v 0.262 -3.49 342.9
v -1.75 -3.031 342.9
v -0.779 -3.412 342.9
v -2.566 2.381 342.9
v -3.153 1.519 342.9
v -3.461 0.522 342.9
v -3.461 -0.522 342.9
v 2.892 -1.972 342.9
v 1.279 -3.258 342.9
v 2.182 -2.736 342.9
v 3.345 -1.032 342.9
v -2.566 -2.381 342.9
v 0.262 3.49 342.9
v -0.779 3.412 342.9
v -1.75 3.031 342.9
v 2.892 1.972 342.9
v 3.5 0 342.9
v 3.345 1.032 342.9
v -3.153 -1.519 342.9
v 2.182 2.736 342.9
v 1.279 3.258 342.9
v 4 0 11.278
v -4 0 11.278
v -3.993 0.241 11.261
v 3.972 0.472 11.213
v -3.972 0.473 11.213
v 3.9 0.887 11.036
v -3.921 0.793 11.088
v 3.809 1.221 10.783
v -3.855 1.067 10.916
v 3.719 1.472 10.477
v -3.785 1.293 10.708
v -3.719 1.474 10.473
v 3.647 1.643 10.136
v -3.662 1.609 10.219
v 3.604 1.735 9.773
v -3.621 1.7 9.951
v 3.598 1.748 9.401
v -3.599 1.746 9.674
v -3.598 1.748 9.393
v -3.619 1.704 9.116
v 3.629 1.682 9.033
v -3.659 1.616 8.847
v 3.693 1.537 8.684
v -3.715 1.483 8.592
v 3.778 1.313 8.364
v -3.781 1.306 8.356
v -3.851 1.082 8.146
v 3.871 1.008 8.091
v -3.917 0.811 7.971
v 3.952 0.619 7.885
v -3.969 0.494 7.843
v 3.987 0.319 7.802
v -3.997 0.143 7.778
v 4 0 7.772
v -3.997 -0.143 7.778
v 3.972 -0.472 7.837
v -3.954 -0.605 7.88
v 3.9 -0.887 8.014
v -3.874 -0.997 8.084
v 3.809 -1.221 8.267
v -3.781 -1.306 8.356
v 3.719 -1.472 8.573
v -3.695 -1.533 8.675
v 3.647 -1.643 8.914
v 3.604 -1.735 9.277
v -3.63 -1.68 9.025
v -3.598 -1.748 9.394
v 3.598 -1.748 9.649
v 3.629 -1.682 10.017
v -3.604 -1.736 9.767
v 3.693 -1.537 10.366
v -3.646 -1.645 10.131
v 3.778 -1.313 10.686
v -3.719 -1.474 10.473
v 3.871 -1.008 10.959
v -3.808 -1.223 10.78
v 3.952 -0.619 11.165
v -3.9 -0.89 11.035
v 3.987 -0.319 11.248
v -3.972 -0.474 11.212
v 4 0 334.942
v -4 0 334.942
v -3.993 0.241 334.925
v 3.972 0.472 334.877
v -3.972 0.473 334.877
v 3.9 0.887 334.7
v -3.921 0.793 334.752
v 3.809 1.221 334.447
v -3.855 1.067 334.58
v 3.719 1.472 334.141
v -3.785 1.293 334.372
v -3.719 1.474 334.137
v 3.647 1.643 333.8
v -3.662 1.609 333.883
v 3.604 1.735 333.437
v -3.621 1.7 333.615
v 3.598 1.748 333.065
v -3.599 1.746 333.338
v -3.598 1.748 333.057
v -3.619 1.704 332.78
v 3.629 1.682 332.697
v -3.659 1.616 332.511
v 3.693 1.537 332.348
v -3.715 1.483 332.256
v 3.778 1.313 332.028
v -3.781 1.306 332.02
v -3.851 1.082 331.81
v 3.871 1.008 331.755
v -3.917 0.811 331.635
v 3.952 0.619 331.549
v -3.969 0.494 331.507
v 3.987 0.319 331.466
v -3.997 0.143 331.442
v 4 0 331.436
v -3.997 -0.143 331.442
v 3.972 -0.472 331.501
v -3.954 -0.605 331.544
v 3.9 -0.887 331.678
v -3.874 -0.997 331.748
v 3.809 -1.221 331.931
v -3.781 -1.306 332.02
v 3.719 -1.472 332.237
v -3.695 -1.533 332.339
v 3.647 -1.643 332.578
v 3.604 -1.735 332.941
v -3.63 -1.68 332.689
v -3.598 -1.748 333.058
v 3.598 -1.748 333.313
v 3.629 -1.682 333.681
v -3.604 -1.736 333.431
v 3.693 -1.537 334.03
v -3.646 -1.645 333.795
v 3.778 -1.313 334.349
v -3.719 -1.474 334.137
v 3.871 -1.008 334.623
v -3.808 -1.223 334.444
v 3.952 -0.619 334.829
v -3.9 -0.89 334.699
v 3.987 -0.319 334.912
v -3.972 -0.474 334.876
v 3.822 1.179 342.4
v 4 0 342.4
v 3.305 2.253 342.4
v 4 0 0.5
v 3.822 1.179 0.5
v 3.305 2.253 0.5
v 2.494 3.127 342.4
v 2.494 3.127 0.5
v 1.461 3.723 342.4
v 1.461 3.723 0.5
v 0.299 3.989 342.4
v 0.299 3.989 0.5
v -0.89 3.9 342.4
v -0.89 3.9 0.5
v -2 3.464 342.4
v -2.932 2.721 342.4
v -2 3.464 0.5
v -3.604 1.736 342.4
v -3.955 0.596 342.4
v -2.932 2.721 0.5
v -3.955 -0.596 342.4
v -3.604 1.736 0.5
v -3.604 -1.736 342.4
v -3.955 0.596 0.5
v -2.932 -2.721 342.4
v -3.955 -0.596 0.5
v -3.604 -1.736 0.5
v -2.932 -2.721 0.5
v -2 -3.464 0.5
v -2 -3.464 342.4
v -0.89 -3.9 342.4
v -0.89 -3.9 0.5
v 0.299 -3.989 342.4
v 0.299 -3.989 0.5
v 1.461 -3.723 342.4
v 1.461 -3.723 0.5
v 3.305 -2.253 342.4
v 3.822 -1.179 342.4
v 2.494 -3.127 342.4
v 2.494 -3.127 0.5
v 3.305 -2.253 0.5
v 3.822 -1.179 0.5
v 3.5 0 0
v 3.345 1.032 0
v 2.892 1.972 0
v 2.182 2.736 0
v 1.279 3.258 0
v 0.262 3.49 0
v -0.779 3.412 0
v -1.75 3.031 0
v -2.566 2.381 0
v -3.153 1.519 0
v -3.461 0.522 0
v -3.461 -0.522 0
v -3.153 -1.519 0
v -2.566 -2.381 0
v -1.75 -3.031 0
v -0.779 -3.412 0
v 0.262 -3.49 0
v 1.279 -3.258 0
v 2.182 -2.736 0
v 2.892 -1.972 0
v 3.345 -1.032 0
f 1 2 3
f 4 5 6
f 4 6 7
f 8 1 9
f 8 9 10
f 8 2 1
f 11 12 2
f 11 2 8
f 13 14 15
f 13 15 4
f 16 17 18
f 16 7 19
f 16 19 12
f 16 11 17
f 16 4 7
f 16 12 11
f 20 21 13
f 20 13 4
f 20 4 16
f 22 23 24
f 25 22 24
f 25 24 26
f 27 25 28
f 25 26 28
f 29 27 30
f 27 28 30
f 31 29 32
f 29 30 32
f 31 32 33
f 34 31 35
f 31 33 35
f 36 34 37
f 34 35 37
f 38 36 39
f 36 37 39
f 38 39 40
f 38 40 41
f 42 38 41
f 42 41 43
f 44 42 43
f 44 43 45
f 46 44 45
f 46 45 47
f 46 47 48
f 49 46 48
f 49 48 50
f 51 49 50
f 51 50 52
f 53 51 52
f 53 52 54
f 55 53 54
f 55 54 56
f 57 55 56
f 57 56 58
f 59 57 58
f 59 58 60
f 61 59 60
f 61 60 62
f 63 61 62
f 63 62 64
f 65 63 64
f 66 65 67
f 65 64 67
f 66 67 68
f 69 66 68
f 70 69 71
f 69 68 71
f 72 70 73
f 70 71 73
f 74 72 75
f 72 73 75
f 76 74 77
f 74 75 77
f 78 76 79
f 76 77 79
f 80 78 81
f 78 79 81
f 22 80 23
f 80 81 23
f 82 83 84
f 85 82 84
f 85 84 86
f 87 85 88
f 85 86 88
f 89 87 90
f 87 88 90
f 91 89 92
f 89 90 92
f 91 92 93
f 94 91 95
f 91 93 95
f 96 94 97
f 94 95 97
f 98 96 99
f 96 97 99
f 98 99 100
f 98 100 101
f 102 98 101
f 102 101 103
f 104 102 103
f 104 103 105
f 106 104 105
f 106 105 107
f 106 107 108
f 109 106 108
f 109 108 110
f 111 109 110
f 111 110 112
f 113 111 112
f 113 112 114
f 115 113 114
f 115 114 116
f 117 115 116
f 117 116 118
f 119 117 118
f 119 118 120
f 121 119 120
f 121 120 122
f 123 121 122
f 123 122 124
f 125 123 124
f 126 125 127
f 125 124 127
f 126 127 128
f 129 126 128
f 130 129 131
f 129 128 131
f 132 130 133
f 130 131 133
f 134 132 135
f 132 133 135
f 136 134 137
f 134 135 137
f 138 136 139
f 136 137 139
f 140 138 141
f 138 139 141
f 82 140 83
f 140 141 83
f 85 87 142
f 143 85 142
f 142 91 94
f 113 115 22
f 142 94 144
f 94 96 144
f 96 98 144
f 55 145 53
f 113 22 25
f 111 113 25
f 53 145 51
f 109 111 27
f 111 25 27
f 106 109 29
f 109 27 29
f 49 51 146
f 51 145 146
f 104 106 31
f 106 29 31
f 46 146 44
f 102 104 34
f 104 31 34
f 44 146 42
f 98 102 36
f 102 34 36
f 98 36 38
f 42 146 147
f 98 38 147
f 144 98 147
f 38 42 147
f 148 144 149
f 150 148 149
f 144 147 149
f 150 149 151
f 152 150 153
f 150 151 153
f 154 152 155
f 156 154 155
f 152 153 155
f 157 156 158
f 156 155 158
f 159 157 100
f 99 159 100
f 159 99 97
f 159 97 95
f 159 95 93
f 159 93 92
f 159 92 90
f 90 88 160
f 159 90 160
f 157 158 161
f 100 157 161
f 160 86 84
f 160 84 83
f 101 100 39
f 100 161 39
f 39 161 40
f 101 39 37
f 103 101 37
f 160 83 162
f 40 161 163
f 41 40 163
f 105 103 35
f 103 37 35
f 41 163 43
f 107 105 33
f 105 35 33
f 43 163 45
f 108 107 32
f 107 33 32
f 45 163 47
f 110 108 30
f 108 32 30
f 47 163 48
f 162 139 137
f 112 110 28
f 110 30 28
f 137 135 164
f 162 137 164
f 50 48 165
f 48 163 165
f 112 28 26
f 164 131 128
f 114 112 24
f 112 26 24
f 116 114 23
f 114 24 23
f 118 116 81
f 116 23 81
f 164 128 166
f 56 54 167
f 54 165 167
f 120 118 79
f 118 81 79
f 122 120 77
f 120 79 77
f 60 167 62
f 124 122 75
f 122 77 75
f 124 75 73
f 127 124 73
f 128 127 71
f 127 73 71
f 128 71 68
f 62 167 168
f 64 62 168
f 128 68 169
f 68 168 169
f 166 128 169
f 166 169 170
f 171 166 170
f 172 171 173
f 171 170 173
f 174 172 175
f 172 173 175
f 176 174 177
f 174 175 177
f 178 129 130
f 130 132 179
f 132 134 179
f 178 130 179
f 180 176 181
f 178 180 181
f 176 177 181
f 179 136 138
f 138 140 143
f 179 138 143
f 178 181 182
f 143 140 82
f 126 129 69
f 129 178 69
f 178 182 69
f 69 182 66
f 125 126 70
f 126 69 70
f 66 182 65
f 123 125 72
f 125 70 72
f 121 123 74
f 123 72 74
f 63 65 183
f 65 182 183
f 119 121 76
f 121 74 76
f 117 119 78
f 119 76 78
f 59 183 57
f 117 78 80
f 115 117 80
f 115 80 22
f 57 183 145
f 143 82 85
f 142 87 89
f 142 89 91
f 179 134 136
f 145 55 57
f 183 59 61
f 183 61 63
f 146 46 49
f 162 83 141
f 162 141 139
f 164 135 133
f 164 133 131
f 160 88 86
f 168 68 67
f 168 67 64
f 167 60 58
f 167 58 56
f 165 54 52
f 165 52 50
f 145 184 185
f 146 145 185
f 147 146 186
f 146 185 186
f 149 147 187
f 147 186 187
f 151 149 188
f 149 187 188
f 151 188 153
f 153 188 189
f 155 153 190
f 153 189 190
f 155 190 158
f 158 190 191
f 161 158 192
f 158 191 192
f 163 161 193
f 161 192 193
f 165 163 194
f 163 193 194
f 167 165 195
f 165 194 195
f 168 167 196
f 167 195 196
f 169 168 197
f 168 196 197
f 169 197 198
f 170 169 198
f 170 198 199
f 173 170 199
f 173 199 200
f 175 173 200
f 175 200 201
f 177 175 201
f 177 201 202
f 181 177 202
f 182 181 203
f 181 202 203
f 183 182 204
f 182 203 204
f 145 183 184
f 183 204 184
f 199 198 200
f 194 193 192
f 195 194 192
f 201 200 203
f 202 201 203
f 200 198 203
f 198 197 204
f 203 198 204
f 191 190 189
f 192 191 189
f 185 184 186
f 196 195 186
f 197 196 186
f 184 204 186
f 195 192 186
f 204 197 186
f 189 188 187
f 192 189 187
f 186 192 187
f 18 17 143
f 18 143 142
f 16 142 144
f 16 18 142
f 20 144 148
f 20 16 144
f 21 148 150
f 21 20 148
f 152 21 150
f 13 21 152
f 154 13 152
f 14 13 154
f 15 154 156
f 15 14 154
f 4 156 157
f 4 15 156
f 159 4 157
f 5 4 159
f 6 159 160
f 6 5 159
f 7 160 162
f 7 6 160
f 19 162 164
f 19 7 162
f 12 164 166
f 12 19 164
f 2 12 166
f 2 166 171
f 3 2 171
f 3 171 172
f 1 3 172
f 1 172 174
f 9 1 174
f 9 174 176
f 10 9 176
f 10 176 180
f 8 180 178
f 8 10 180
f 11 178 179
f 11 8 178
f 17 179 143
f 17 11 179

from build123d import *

# Parameters (mm, degrees)
SKETCH1_R           = 4
BOSS_EXTRUDE1_DEPTH = 342.9
CHAMFER1_SIZE       = 0.5
SKETCH3_R           = 1.7526
CUT_EXTRUDE1_DEPTH  = 344.01663225


with BuildPart() as part:
    # Sketch1 → Boss-Extrude1 (new body)
    with BuildSketch(Plane.XY):
        Circle(SKETCH1_R)
    extrude(amount=BOSS_EXTRUDE1_DEPTH)

    # Chamfer1
    chamfer1_edges = [part.edges().sort_by_distance(p)[0] for p in [
        (-4, 0, 0),
        (-4, 0, 342.9),
    ]]
    chamfer(chamfer1_edges, length=CHAMFER1_SIZE)

    # Sketch3 → Cut-Extrude1 (cut, through all)
    with BuildSketch(Plane.ZY.offset(4)):
        with Locations((9.525, 0)):
            Circle(SKETCH3_R)
        with Locations((333.188999311, 0)):
            Circle(SKETCH3_R)
    extrude(amount=-CUT_EXTRUDE1_DEPTH, mode=Mode.SUBTRACT)


solid = part.part
